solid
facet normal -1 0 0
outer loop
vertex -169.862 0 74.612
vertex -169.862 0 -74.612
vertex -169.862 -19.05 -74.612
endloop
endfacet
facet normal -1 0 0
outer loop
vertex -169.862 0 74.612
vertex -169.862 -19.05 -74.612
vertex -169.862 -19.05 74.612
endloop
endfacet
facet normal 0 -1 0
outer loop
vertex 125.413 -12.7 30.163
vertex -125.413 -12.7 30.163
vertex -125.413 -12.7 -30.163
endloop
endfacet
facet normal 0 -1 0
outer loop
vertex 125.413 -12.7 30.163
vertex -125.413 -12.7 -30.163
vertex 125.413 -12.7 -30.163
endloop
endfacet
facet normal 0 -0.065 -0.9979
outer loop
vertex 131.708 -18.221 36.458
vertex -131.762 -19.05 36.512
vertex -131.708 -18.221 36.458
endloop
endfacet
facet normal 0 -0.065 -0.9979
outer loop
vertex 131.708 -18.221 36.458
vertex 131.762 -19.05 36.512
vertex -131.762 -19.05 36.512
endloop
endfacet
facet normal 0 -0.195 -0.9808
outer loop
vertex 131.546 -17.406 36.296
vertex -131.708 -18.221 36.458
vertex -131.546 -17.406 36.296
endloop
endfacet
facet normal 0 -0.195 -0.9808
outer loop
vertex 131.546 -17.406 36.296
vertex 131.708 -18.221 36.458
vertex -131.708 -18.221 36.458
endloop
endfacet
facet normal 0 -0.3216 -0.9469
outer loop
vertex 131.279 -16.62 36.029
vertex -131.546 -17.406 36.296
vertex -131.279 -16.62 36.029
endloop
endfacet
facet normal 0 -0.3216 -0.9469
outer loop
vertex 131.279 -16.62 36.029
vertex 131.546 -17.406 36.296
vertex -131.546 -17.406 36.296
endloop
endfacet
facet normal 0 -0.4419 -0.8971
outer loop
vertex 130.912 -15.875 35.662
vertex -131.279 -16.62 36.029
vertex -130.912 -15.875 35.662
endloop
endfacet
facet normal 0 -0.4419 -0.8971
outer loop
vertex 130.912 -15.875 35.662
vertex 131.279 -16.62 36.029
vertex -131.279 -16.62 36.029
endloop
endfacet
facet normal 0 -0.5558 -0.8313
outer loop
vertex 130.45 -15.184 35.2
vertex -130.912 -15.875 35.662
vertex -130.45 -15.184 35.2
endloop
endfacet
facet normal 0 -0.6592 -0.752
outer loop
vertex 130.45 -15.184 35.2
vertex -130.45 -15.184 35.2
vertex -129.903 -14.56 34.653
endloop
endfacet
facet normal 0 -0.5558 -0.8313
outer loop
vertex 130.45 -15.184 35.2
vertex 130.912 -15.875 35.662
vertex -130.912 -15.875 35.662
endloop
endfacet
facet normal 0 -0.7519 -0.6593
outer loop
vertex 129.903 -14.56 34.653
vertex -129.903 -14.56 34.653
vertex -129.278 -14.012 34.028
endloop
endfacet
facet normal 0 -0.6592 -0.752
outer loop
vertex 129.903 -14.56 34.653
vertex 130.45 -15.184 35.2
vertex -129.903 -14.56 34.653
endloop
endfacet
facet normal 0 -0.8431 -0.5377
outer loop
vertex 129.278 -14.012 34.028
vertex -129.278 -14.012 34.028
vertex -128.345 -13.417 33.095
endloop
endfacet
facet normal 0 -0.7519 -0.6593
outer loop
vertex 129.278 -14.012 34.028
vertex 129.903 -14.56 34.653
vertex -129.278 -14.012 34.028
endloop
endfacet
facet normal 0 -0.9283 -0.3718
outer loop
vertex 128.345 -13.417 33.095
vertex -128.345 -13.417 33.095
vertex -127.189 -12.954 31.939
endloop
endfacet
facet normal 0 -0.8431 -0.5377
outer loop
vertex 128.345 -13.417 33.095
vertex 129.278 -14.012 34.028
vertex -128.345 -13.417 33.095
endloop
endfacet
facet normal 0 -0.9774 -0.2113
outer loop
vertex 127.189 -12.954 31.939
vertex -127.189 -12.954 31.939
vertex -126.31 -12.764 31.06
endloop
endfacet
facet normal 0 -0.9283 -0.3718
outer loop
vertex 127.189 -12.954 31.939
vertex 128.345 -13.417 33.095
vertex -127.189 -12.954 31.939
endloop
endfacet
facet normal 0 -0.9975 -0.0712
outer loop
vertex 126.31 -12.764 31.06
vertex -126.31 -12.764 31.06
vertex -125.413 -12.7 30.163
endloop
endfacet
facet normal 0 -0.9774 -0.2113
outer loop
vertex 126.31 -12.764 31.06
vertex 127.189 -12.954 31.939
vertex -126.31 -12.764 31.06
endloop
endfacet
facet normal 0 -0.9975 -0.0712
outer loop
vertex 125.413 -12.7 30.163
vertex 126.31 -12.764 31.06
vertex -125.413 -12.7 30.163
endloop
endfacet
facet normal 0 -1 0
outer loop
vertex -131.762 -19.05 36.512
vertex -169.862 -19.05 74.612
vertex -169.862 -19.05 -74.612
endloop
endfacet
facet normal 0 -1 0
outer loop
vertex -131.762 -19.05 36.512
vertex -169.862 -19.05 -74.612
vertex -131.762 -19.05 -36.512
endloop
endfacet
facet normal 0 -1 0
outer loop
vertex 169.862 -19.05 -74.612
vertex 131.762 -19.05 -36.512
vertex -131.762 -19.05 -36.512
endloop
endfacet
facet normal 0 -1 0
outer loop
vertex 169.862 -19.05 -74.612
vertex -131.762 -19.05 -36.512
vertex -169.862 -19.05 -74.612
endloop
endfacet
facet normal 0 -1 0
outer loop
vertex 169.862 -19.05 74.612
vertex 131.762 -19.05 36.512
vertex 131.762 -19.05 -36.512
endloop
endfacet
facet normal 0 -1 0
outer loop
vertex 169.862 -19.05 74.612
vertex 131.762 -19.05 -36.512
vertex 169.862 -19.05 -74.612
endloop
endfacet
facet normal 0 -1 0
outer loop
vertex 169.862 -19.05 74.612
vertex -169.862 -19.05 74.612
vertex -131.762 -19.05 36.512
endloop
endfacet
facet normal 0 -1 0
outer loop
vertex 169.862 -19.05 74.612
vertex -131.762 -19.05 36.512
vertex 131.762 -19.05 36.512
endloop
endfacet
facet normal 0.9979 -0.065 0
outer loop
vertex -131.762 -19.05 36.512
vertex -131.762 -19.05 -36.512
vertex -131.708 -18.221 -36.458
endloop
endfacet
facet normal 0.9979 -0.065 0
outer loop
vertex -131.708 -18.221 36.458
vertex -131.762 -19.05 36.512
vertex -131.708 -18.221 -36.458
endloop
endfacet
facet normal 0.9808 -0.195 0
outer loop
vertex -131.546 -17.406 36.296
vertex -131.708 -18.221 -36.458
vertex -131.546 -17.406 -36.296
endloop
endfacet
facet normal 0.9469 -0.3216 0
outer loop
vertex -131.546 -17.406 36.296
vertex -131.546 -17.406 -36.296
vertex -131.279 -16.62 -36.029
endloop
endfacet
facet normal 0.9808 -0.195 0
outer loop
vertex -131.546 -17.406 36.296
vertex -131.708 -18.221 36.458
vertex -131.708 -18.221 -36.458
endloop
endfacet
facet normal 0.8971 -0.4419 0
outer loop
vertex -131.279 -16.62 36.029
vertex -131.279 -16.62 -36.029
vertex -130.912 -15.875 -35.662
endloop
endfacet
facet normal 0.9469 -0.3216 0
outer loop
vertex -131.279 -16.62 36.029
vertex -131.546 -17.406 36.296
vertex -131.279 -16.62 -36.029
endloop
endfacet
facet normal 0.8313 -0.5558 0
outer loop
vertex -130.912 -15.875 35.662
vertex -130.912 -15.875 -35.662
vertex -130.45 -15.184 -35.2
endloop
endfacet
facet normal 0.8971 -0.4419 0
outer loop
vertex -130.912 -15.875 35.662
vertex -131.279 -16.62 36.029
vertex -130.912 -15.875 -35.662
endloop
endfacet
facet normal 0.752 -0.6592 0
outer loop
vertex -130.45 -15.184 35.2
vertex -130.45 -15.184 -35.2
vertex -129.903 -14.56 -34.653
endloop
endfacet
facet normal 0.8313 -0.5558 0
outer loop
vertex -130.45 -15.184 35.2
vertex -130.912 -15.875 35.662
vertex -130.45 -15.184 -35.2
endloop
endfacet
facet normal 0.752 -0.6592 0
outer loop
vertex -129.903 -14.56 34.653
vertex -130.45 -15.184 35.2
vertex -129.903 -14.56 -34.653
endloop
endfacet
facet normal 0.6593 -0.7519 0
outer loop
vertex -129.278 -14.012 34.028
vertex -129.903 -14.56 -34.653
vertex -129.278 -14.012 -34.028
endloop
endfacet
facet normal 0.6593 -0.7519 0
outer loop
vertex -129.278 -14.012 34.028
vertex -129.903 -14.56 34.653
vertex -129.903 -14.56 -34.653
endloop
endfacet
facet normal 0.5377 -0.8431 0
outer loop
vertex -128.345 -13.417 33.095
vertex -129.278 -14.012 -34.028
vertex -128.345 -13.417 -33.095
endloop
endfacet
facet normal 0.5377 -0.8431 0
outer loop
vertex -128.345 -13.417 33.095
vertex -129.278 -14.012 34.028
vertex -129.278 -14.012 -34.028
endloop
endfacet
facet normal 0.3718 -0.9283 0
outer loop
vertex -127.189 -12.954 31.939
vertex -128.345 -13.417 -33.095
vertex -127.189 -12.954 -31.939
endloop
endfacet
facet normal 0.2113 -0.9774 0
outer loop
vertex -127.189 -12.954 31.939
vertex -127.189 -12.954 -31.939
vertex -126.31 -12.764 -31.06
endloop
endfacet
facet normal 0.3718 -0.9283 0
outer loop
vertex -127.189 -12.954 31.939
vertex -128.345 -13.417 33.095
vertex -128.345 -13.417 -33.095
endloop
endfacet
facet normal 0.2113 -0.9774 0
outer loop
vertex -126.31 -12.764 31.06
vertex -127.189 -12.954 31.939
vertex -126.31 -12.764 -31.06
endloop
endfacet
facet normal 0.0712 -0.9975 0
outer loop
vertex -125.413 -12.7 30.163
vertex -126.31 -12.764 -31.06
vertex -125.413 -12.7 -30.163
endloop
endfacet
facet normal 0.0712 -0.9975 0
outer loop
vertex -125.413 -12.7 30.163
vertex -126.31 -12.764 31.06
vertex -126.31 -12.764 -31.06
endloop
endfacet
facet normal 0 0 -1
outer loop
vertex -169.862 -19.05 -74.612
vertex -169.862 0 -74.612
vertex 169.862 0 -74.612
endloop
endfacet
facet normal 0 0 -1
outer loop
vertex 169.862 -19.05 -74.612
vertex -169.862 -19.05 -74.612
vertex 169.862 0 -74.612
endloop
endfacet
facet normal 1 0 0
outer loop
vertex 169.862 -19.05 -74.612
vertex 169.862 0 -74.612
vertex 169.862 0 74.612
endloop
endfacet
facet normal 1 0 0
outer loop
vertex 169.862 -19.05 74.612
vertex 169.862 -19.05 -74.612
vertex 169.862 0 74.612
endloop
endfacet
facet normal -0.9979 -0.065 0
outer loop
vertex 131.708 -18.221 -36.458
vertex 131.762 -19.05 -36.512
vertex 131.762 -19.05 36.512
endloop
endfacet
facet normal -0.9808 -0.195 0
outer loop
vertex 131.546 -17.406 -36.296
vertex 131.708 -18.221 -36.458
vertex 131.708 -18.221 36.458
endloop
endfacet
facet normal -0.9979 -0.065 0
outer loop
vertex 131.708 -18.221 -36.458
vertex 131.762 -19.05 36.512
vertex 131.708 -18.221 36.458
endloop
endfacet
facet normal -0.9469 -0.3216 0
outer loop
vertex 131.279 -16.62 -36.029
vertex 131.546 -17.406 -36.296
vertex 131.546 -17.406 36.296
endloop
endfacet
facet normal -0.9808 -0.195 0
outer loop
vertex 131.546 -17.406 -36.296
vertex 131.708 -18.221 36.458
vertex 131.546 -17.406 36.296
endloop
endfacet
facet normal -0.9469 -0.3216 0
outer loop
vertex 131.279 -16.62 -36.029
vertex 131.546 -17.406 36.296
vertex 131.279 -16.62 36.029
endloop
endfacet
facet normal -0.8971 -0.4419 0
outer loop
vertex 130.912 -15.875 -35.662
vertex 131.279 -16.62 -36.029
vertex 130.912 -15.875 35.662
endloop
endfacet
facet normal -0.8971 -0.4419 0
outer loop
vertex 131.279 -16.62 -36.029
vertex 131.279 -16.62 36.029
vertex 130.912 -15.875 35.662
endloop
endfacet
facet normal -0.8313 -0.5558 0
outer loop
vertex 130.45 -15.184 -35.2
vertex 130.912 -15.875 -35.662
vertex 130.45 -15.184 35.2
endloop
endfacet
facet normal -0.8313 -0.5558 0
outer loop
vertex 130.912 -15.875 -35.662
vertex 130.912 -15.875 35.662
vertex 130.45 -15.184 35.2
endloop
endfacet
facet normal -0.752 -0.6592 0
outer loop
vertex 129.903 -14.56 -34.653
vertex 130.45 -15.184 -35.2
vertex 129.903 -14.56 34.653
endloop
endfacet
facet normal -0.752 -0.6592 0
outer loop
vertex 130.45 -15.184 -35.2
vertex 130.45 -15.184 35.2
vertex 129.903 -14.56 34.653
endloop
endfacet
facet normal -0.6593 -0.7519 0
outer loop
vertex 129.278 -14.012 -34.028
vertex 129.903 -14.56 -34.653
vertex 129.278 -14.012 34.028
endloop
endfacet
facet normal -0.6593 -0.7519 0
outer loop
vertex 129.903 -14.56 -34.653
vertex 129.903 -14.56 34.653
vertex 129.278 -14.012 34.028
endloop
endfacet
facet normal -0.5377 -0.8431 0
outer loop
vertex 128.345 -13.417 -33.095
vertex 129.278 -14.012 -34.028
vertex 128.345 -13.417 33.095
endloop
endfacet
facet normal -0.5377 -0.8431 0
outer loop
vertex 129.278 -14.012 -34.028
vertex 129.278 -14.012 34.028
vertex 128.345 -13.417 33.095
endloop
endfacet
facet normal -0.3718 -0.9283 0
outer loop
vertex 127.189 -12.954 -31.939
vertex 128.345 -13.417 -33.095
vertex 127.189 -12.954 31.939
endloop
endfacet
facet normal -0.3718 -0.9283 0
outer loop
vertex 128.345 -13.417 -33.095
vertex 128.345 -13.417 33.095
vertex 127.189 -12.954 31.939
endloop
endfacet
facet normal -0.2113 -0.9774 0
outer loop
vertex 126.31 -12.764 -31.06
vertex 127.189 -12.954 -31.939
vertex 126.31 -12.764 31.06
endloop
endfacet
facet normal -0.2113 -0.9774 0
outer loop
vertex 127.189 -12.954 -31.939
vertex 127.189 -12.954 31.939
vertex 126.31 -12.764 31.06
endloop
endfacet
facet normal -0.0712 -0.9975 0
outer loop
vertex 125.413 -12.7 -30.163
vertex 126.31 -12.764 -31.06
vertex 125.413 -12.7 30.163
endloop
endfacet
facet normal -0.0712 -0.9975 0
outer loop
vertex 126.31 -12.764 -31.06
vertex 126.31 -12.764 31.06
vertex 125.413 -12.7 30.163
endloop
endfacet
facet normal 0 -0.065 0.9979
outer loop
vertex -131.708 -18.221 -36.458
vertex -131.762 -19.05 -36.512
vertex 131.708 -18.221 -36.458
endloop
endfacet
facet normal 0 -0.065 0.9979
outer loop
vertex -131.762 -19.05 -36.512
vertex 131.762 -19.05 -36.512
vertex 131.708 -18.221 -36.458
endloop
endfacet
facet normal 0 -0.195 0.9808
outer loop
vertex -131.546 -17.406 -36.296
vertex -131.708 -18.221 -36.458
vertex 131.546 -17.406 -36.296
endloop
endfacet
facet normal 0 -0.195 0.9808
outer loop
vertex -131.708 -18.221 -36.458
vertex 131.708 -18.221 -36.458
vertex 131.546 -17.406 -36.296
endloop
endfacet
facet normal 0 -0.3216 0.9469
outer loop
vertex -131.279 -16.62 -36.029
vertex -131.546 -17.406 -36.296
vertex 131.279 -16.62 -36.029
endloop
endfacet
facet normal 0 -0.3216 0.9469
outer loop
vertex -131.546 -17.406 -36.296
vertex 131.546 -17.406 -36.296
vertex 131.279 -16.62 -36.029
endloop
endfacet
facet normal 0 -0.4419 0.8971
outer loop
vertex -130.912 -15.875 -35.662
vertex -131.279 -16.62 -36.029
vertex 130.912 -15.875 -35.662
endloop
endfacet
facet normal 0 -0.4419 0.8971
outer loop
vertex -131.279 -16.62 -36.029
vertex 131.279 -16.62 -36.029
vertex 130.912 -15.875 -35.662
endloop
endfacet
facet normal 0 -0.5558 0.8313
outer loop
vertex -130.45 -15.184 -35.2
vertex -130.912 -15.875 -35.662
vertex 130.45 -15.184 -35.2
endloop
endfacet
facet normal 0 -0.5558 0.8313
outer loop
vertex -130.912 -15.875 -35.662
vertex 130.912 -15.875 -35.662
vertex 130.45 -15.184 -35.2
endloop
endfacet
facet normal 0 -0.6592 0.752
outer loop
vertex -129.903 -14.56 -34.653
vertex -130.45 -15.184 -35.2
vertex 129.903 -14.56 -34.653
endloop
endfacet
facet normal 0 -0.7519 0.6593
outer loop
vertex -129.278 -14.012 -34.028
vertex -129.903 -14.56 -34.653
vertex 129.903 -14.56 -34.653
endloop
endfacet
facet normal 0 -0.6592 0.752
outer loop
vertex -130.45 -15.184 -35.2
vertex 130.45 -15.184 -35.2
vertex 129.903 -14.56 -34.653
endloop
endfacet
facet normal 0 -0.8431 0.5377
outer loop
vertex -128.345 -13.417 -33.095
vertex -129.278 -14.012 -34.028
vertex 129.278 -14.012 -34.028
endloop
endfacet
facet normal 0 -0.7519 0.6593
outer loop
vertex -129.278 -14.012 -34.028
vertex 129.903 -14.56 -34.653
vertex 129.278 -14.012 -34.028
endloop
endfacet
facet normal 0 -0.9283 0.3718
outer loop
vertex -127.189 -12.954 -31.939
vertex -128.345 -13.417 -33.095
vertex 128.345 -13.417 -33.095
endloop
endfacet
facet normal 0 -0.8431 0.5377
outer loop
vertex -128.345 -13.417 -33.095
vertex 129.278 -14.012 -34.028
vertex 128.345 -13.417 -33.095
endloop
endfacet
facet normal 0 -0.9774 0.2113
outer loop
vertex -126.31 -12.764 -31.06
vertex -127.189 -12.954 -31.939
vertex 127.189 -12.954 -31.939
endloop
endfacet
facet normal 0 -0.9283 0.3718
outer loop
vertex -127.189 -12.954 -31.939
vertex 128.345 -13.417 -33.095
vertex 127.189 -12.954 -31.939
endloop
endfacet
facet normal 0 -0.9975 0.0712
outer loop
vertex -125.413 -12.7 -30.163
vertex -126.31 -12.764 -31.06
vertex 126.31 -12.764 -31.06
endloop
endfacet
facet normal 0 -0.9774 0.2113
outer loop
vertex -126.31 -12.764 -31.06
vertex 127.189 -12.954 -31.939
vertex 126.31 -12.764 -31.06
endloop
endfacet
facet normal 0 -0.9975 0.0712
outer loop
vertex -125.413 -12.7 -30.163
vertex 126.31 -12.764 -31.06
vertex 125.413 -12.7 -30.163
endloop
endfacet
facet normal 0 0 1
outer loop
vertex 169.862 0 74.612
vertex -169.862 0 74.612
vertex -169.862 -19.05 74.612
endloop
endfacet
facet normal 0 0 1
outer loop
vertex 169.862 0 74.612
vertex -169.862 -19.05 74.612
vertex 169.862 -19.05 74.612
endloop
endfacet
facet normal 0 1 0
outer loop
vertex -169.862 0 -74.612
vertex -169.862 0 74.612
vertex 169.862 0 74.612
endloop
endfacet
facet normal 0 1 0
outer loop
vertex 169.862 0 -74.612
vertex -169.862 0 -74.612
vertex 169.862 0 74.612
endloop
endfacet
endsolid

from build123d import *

# Parameters (mm, degrees)
F0_W     = 339.725
F0_H     = 149.225
F0_W_2   = 263.525
F0_H_2   = 73.025
F1_DEPTH = 19.05
F2_DEPTH = 12.7
F3_R     = 6.34999


# Not quite as in the source:
# - a fillet or chamfer is up to 0.001 mm smaller than in the source, because OpenCascade refuses the exact size


with BuildPart() as f1:
    # F0 (on Front) → F1 (new body)
    with BuildSketch(Plane.XZ):
        Rectangle(F0_W, F0_H)
        Rectangle(F0_W_2, F0_H_2, mode=Mode.SUBTRACT)
    extrude(amount=F1_DEPTH)

    # F0 (on Front) → F2 (join)
    with BuildSketch(Plane.XZ):
        Rectangle(F0_W_2, F0_H_2)
    extrude(amount=F2_DEPTH)

    # F3 (radius 6.35 in the source; OpenCascade refuses exactly that, so slightly less here)
    f3_edges = [f1.edges().sort_by_distance(p)[0] for p in [
        (0, -12.7, 36.5125),
        (-131.7625, -12.7, 0),
        (0, -12.7, -36.5125),
        (131.7625, -12.7, 0),
    ]]
    fillet(f3_edges, radius=F3_R)


solid = f1.part
